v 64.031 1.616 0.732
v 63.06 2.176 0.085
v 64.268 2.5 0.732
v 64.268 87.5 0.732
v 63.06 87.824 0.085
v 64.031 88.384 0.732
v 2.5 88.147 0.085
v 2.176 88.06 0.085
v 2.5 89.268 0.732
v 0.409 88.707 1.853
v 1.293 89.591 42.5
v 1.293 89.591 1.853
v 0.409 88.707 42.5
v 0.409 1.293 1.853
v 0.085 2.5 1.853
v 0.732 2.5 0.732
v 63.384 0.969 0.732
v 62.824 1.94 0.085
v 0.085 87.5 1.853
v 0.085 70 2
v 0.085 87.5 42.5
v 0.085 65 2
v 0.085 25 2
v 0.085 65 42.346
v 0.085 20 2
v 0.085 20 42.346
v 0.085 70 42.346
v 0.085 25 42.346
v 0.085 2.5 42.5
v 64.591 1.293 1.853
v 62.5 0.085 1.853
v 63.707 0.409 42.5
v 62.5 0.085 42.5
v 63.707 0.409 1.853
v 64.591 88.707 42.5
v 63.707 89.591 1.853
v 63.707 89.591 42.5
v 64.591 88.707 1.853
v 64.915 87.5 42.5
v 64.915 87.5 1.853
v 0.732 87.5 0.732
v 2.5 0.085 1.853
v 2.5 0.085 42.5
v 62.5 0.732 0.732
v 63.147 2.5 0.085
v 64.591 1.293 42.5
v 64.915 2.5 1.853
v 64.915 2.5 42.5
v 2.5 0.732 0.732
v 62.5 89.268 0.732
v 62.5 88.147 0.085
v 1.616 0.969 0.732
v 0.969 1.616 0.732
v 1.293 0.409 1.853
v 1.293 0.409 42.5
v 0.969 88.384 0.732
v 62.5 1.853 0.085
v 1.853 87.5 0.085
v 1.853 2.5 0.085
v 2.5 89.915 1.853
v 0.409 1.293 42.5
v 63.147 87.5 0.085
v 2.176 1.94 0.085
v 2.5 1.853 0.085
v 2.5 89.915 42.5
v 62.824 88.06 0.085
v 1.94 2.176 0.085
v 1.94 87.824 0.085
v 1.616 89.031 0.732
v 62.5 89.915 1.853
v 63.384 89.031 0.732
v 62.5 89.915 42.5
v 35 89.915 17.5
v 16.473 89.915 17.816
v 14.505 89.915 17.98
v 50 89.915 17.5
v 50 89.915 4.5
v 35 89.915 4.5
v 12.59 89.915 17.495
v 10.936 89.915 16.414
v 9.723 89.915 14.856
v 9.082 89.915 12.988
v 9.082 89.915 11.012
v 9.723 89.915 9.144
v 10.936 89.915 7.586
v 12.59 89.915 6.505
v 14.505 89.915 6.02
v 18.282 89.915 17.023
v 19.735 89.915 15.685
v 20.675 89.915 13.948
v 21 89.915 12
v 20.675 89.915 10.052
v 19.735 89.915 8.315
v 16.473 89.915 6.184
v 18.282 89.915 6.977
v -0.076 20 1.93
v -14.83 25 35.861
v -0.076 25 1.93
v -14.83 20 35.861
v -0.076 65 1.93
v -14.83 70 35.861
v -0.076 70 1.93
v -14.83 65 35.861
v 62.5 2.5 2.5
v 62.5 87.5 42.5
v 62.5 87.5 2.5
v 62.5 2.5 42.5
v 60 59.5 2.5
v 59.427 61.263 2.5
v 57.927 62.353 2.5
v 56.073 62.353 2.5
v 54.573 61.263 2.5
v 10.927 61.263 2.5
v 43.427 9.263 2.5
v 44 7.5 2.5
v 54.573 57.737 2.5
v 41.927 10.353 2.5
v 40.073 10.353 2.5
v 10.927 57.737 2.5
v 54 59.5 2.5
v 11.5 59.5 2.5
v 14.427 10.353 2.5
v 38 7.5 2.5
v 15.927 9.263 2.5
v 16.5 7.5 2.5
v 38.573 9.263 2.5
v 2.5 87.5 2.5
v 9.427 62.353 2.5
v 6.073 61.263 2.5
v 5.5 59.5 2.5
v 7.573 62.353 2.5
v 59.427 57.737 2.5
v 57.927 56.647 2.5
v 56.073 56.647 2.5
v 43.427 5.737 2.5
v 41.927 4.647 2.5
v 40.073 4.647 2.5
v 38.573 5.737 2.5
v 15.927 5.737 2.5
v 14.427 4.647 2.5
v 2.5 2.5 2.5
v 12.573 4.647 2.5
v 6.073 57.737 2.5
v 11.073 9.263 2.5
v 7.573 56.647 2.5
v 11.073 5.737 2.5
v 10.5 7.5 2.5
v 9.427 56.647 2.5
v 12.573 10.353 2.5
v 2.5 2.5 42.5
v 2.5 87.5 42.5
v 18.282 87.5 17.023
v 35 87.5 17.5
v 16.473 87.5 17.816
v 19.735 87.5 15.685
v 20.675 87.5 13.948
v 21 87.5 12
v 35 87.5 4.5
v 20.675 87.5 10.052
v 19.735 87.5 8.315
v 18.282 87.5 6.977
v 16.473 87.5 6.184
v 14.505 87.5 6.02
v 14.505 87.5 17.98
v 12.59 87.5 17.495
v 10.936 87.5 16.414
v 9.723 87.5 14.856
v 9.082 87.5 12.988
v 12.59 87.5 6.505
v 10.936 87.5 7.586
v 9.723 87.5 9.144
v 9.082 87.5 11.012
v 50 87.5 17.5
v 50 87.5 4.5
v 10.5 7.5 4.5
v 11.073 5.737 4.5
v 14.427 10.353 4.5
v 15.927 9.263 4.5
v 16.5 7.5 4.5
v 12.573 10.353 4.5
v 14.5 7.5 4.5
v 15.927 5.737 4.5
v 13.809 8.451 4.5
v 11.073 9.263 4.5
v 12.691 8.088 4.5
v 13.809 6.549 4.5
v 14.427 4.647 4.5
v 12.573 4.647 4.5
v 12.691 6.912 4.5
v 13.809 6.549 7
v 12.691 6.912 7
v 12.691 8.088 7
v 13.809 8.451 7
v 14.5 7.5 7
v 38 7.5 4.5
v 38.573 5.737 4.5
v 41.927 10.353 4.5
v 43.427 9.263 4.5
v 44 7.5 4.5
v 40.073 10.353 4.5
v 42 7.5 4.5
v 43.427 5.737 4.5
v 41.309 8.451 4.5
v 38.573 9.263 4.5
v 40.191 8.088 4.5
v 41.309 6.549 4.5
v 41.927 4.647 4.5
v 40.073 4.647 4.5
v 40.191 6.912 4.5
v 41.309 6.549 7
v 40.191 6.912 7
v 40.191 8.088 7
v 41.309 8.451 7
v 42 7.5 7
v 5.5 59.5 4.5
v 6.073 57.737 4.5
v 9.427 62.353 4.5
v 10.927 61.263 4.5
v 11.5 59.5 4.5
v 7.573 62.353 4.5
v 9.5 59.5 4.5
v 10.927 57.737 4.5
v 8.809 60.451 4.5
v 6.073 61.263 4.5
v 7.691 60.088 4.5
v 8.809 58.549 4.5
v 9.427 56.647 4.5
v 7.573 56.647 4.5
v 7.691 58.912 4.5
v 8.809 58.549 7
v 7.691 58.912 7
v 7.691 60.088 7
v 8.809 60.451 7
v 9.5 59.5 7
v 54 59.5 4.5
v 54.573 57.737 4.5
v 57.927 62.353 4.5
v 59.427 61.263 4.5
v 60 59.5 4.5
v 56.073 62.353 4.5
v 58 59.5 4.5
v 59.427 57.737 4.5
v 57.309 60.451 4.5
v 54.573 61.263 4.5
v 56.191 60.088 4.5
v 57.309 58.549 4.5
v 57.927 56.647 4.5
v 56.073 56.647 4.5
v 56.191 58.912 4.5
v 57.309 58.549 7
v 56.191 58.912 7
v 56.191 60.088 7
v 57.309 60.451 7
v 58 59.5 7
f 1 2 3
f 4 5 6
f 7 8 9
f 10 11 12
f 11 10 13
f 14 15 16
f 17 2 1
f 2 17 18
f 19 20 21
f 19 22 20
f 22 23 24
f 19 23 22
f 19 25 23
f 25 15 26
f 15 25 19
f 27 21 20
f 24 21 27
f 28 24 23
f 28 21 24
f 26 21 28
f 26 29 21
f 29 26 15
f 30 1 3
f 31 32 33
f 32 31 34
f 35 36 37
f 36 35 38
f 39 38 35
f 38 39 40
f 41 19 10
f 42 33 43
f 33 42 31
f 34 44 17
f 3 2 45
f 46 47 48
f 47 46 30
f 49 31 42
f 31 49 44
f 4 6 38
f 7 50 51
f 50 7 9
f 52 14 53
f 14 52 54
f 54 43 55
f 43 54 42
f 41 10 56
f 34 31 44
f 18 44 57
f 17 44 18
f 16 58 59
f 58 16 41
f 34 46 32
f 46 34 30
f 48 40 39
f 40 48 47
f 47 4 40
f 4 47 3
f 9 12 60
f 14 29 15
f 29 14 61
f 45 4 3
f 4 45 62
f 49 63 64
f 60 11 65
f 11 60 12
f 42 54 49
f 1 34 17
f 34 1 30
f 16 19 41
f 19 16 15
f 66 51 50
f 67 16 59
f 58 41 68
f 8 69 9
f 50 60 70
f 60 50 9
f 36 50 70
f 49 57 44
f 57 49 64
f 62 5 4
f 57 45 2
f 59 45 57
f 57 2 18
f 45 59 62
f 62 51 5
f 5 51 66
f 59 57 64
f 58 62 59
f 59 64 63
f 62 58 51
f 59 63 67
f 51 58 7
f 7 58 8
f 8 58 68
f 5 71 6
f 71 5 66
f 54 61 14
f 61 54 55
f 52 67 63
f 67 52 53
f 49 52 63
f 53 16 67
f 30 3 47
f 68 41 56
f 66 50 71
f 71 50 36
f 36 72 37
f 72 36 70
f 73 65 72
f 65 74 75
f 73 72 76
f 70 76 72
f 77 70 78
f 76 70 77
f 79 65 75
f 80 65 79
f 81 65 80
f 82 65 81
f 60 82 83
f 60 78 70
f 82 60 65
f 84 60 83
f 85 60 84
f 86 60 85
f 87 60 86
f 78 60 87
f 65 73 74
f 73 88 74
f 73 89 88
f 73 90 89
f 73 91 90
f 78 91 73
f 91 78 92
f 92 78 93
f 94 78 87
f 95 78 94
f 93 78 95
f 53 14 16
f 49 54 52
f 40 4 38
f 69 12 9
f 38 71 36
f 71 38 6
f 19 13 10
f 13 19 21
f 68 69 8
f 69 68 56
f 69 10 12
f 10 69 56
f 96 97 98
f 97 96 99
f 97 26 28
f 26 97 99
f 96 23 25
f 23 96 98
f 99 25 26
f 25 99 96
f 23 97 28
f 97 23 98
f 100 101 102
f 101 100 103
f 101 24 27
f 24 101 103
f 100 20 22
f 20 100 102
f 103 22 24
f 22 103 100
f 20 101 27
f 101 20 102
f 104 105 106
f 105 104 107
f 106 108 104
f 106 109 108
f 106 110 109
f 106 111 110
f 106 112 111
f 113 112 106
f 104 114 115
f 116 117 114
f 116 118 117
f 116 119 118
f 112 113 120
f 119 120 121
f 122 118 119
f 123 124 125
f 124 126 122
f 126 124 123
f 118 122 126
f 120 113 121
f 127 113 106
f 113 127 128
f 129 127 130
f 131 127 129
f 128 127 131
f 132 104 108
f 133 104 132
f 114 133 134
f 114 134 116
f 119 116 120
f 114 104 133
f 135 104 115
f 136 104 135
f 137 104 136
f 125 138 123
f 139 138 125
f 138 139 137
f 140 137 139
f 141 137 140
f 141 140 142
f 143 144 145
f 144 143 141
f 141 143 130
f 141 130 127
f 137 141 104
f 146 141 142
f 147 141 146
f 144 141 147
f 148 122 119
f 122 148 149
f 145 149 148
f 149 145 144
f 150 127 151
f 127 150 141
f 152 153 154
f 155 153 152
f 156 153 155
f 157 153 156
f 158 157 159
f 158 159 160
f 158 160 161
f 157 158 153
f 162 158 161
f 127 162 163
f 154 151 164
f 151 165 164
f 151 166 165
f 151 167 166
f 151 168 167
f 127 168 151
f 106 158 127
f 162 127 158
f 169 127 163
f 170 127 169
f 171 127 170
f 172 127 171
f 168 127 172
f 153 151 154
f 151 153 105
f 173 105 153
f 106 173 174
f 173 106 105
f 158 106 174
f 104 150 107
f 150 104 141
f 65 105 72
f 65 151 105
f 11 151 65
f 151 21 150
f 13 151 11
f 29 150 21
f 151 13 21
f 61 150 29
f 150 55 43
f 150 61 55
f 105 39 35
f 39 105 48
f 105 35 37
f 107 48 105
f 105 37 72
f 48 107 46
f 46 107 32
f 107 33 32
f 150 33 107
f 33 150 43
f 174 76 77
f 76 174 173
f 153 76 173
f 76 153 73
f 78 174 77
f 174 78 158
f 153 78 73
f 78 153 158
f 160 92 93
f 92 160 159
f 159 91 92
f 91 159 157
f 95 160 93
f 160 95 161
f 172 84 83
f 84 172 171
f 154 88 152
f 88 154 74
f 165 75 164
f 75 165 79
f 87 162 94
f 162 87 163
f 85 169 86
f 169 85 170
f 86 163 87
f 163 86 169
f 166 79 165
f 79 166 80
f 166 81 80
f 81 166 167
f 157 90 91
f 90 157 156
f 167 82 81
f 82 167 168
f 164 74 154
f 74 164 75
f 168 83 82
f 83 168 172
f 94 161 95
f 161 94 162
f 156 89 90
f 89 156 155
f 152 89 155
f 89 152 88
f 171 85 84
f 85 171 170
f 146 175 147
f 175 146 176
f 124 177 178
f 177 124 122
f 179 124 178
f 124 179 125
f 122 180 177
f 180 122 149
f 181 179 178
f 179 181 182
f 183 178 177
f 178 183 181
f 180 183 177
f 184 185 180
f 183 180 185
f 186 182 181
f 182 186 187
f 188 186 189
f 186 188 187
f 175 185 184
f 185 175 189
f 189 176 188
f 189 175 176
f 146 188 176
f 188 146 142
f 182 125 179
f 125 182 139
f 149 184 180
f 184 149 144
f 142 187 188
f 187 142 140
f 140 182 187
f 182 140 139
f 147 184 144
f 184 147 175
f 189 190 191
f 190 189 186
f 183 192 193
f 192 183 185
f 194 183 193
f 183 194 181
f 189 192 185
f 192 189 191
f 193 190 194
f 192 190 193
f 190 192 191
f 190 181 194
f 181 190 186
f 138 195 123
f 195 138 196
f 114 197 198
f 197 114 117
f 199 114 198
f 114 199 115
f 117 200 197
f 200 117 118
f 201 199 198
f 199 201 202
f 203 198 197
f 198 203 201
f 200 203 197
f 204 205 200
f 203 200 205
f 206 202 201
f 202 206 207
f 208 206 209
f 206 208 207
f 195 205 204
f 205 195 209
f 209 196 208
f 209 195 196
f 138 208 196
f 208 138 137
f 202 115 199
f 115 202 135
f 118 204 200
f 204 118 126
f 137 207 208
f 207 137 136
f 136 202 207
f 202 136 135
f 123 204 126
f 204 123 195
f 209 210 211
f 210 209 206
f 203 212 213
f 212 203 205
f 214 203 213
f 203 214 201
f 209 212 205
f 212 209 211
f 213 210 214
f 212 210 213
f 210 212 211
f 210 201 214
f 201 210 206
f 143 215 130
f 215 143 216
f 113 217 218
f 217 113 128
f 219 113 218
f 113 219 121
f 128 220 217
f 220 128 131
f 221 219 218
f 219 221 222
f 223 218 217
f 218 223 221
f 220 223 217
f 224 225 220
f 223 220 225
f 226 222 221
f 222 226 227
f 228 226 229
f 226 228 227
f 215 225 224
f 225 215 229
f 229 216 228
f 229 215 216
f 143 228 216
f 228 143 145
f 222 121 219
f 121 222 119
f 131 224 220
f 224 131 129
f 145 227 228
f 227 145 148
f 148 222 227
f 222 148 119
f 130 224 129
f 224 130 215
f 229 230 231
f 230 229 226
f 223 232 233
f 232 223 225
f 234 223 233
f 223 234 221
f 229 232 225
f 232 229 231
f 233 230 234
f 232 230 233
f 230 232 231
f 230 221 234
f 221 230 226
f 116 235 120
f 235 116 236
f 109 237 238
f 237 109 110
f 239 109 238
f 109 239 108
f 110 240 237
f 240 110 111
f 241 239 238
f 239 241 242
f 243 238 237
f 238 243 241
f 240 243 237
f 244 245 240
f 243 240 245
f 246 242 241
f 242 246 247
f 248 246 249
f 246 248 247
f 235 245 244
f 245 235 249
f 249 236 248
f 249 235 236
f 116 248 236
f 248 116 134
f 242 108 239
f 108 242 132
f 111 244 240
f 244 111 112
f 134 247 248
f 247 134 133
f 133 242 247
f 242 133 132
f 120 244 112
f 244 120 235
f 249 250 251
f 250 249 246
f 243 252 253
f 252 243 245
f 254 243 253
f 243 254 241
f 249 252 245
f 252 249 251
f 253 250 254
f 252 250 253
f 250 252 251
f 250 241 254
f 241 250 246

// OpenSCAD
module cbox(x,y,z,c){       //curved box template
    minkowski(){
cube([x-2*c,y-2*c,z-2*c]);
    translate([c,c,c])
    sphere(r=c,$fn=12);
}
}

module pillar(){                //standoff pillar template
translate([0,0,0.5])
    cylinder(r=3,h=4);
    translate([0,0,1])
    cylinder(r=1,h=6);
}

difference(){                   //hollow box
union(){
    
cbox(65,90,50,2.5);             //main body

rotate([0,-23.5,0])
translate([0.7,20,1.8])
cube([30,5,37]);             //legs (so they get carved away right)

rotate([0,-23.5,0])
translate([0.7,65,1.8])
cube([30,5,37]);             //legs (so they get carved away right)
}
translate([2.5,2.5,2.5])            //hollow interior
    cube([60,85,50]);

translate([-5,-5,42.5])             //flat top
    cube([120,120,100]);

translate([35,80,4.5])      //square cutout for USB
  cube([15,20,13]);
//translate([42.5,80,11])     //round cutout for USB
  //  rotate([270,0,0])
    //cylinder(r=8,h=20);

translate([15,80,12])     //round cutout for dc jack
    rotate([270,0,0])
    cylinder(r=6,h=20);

}

translate([13.5,7.5,0])           //pillars
pillar();
translate([41,7.5,0])
pillar();
translate([8.5,59.5,0])
pillar();
translate([57,59.5,0])
pillar();
